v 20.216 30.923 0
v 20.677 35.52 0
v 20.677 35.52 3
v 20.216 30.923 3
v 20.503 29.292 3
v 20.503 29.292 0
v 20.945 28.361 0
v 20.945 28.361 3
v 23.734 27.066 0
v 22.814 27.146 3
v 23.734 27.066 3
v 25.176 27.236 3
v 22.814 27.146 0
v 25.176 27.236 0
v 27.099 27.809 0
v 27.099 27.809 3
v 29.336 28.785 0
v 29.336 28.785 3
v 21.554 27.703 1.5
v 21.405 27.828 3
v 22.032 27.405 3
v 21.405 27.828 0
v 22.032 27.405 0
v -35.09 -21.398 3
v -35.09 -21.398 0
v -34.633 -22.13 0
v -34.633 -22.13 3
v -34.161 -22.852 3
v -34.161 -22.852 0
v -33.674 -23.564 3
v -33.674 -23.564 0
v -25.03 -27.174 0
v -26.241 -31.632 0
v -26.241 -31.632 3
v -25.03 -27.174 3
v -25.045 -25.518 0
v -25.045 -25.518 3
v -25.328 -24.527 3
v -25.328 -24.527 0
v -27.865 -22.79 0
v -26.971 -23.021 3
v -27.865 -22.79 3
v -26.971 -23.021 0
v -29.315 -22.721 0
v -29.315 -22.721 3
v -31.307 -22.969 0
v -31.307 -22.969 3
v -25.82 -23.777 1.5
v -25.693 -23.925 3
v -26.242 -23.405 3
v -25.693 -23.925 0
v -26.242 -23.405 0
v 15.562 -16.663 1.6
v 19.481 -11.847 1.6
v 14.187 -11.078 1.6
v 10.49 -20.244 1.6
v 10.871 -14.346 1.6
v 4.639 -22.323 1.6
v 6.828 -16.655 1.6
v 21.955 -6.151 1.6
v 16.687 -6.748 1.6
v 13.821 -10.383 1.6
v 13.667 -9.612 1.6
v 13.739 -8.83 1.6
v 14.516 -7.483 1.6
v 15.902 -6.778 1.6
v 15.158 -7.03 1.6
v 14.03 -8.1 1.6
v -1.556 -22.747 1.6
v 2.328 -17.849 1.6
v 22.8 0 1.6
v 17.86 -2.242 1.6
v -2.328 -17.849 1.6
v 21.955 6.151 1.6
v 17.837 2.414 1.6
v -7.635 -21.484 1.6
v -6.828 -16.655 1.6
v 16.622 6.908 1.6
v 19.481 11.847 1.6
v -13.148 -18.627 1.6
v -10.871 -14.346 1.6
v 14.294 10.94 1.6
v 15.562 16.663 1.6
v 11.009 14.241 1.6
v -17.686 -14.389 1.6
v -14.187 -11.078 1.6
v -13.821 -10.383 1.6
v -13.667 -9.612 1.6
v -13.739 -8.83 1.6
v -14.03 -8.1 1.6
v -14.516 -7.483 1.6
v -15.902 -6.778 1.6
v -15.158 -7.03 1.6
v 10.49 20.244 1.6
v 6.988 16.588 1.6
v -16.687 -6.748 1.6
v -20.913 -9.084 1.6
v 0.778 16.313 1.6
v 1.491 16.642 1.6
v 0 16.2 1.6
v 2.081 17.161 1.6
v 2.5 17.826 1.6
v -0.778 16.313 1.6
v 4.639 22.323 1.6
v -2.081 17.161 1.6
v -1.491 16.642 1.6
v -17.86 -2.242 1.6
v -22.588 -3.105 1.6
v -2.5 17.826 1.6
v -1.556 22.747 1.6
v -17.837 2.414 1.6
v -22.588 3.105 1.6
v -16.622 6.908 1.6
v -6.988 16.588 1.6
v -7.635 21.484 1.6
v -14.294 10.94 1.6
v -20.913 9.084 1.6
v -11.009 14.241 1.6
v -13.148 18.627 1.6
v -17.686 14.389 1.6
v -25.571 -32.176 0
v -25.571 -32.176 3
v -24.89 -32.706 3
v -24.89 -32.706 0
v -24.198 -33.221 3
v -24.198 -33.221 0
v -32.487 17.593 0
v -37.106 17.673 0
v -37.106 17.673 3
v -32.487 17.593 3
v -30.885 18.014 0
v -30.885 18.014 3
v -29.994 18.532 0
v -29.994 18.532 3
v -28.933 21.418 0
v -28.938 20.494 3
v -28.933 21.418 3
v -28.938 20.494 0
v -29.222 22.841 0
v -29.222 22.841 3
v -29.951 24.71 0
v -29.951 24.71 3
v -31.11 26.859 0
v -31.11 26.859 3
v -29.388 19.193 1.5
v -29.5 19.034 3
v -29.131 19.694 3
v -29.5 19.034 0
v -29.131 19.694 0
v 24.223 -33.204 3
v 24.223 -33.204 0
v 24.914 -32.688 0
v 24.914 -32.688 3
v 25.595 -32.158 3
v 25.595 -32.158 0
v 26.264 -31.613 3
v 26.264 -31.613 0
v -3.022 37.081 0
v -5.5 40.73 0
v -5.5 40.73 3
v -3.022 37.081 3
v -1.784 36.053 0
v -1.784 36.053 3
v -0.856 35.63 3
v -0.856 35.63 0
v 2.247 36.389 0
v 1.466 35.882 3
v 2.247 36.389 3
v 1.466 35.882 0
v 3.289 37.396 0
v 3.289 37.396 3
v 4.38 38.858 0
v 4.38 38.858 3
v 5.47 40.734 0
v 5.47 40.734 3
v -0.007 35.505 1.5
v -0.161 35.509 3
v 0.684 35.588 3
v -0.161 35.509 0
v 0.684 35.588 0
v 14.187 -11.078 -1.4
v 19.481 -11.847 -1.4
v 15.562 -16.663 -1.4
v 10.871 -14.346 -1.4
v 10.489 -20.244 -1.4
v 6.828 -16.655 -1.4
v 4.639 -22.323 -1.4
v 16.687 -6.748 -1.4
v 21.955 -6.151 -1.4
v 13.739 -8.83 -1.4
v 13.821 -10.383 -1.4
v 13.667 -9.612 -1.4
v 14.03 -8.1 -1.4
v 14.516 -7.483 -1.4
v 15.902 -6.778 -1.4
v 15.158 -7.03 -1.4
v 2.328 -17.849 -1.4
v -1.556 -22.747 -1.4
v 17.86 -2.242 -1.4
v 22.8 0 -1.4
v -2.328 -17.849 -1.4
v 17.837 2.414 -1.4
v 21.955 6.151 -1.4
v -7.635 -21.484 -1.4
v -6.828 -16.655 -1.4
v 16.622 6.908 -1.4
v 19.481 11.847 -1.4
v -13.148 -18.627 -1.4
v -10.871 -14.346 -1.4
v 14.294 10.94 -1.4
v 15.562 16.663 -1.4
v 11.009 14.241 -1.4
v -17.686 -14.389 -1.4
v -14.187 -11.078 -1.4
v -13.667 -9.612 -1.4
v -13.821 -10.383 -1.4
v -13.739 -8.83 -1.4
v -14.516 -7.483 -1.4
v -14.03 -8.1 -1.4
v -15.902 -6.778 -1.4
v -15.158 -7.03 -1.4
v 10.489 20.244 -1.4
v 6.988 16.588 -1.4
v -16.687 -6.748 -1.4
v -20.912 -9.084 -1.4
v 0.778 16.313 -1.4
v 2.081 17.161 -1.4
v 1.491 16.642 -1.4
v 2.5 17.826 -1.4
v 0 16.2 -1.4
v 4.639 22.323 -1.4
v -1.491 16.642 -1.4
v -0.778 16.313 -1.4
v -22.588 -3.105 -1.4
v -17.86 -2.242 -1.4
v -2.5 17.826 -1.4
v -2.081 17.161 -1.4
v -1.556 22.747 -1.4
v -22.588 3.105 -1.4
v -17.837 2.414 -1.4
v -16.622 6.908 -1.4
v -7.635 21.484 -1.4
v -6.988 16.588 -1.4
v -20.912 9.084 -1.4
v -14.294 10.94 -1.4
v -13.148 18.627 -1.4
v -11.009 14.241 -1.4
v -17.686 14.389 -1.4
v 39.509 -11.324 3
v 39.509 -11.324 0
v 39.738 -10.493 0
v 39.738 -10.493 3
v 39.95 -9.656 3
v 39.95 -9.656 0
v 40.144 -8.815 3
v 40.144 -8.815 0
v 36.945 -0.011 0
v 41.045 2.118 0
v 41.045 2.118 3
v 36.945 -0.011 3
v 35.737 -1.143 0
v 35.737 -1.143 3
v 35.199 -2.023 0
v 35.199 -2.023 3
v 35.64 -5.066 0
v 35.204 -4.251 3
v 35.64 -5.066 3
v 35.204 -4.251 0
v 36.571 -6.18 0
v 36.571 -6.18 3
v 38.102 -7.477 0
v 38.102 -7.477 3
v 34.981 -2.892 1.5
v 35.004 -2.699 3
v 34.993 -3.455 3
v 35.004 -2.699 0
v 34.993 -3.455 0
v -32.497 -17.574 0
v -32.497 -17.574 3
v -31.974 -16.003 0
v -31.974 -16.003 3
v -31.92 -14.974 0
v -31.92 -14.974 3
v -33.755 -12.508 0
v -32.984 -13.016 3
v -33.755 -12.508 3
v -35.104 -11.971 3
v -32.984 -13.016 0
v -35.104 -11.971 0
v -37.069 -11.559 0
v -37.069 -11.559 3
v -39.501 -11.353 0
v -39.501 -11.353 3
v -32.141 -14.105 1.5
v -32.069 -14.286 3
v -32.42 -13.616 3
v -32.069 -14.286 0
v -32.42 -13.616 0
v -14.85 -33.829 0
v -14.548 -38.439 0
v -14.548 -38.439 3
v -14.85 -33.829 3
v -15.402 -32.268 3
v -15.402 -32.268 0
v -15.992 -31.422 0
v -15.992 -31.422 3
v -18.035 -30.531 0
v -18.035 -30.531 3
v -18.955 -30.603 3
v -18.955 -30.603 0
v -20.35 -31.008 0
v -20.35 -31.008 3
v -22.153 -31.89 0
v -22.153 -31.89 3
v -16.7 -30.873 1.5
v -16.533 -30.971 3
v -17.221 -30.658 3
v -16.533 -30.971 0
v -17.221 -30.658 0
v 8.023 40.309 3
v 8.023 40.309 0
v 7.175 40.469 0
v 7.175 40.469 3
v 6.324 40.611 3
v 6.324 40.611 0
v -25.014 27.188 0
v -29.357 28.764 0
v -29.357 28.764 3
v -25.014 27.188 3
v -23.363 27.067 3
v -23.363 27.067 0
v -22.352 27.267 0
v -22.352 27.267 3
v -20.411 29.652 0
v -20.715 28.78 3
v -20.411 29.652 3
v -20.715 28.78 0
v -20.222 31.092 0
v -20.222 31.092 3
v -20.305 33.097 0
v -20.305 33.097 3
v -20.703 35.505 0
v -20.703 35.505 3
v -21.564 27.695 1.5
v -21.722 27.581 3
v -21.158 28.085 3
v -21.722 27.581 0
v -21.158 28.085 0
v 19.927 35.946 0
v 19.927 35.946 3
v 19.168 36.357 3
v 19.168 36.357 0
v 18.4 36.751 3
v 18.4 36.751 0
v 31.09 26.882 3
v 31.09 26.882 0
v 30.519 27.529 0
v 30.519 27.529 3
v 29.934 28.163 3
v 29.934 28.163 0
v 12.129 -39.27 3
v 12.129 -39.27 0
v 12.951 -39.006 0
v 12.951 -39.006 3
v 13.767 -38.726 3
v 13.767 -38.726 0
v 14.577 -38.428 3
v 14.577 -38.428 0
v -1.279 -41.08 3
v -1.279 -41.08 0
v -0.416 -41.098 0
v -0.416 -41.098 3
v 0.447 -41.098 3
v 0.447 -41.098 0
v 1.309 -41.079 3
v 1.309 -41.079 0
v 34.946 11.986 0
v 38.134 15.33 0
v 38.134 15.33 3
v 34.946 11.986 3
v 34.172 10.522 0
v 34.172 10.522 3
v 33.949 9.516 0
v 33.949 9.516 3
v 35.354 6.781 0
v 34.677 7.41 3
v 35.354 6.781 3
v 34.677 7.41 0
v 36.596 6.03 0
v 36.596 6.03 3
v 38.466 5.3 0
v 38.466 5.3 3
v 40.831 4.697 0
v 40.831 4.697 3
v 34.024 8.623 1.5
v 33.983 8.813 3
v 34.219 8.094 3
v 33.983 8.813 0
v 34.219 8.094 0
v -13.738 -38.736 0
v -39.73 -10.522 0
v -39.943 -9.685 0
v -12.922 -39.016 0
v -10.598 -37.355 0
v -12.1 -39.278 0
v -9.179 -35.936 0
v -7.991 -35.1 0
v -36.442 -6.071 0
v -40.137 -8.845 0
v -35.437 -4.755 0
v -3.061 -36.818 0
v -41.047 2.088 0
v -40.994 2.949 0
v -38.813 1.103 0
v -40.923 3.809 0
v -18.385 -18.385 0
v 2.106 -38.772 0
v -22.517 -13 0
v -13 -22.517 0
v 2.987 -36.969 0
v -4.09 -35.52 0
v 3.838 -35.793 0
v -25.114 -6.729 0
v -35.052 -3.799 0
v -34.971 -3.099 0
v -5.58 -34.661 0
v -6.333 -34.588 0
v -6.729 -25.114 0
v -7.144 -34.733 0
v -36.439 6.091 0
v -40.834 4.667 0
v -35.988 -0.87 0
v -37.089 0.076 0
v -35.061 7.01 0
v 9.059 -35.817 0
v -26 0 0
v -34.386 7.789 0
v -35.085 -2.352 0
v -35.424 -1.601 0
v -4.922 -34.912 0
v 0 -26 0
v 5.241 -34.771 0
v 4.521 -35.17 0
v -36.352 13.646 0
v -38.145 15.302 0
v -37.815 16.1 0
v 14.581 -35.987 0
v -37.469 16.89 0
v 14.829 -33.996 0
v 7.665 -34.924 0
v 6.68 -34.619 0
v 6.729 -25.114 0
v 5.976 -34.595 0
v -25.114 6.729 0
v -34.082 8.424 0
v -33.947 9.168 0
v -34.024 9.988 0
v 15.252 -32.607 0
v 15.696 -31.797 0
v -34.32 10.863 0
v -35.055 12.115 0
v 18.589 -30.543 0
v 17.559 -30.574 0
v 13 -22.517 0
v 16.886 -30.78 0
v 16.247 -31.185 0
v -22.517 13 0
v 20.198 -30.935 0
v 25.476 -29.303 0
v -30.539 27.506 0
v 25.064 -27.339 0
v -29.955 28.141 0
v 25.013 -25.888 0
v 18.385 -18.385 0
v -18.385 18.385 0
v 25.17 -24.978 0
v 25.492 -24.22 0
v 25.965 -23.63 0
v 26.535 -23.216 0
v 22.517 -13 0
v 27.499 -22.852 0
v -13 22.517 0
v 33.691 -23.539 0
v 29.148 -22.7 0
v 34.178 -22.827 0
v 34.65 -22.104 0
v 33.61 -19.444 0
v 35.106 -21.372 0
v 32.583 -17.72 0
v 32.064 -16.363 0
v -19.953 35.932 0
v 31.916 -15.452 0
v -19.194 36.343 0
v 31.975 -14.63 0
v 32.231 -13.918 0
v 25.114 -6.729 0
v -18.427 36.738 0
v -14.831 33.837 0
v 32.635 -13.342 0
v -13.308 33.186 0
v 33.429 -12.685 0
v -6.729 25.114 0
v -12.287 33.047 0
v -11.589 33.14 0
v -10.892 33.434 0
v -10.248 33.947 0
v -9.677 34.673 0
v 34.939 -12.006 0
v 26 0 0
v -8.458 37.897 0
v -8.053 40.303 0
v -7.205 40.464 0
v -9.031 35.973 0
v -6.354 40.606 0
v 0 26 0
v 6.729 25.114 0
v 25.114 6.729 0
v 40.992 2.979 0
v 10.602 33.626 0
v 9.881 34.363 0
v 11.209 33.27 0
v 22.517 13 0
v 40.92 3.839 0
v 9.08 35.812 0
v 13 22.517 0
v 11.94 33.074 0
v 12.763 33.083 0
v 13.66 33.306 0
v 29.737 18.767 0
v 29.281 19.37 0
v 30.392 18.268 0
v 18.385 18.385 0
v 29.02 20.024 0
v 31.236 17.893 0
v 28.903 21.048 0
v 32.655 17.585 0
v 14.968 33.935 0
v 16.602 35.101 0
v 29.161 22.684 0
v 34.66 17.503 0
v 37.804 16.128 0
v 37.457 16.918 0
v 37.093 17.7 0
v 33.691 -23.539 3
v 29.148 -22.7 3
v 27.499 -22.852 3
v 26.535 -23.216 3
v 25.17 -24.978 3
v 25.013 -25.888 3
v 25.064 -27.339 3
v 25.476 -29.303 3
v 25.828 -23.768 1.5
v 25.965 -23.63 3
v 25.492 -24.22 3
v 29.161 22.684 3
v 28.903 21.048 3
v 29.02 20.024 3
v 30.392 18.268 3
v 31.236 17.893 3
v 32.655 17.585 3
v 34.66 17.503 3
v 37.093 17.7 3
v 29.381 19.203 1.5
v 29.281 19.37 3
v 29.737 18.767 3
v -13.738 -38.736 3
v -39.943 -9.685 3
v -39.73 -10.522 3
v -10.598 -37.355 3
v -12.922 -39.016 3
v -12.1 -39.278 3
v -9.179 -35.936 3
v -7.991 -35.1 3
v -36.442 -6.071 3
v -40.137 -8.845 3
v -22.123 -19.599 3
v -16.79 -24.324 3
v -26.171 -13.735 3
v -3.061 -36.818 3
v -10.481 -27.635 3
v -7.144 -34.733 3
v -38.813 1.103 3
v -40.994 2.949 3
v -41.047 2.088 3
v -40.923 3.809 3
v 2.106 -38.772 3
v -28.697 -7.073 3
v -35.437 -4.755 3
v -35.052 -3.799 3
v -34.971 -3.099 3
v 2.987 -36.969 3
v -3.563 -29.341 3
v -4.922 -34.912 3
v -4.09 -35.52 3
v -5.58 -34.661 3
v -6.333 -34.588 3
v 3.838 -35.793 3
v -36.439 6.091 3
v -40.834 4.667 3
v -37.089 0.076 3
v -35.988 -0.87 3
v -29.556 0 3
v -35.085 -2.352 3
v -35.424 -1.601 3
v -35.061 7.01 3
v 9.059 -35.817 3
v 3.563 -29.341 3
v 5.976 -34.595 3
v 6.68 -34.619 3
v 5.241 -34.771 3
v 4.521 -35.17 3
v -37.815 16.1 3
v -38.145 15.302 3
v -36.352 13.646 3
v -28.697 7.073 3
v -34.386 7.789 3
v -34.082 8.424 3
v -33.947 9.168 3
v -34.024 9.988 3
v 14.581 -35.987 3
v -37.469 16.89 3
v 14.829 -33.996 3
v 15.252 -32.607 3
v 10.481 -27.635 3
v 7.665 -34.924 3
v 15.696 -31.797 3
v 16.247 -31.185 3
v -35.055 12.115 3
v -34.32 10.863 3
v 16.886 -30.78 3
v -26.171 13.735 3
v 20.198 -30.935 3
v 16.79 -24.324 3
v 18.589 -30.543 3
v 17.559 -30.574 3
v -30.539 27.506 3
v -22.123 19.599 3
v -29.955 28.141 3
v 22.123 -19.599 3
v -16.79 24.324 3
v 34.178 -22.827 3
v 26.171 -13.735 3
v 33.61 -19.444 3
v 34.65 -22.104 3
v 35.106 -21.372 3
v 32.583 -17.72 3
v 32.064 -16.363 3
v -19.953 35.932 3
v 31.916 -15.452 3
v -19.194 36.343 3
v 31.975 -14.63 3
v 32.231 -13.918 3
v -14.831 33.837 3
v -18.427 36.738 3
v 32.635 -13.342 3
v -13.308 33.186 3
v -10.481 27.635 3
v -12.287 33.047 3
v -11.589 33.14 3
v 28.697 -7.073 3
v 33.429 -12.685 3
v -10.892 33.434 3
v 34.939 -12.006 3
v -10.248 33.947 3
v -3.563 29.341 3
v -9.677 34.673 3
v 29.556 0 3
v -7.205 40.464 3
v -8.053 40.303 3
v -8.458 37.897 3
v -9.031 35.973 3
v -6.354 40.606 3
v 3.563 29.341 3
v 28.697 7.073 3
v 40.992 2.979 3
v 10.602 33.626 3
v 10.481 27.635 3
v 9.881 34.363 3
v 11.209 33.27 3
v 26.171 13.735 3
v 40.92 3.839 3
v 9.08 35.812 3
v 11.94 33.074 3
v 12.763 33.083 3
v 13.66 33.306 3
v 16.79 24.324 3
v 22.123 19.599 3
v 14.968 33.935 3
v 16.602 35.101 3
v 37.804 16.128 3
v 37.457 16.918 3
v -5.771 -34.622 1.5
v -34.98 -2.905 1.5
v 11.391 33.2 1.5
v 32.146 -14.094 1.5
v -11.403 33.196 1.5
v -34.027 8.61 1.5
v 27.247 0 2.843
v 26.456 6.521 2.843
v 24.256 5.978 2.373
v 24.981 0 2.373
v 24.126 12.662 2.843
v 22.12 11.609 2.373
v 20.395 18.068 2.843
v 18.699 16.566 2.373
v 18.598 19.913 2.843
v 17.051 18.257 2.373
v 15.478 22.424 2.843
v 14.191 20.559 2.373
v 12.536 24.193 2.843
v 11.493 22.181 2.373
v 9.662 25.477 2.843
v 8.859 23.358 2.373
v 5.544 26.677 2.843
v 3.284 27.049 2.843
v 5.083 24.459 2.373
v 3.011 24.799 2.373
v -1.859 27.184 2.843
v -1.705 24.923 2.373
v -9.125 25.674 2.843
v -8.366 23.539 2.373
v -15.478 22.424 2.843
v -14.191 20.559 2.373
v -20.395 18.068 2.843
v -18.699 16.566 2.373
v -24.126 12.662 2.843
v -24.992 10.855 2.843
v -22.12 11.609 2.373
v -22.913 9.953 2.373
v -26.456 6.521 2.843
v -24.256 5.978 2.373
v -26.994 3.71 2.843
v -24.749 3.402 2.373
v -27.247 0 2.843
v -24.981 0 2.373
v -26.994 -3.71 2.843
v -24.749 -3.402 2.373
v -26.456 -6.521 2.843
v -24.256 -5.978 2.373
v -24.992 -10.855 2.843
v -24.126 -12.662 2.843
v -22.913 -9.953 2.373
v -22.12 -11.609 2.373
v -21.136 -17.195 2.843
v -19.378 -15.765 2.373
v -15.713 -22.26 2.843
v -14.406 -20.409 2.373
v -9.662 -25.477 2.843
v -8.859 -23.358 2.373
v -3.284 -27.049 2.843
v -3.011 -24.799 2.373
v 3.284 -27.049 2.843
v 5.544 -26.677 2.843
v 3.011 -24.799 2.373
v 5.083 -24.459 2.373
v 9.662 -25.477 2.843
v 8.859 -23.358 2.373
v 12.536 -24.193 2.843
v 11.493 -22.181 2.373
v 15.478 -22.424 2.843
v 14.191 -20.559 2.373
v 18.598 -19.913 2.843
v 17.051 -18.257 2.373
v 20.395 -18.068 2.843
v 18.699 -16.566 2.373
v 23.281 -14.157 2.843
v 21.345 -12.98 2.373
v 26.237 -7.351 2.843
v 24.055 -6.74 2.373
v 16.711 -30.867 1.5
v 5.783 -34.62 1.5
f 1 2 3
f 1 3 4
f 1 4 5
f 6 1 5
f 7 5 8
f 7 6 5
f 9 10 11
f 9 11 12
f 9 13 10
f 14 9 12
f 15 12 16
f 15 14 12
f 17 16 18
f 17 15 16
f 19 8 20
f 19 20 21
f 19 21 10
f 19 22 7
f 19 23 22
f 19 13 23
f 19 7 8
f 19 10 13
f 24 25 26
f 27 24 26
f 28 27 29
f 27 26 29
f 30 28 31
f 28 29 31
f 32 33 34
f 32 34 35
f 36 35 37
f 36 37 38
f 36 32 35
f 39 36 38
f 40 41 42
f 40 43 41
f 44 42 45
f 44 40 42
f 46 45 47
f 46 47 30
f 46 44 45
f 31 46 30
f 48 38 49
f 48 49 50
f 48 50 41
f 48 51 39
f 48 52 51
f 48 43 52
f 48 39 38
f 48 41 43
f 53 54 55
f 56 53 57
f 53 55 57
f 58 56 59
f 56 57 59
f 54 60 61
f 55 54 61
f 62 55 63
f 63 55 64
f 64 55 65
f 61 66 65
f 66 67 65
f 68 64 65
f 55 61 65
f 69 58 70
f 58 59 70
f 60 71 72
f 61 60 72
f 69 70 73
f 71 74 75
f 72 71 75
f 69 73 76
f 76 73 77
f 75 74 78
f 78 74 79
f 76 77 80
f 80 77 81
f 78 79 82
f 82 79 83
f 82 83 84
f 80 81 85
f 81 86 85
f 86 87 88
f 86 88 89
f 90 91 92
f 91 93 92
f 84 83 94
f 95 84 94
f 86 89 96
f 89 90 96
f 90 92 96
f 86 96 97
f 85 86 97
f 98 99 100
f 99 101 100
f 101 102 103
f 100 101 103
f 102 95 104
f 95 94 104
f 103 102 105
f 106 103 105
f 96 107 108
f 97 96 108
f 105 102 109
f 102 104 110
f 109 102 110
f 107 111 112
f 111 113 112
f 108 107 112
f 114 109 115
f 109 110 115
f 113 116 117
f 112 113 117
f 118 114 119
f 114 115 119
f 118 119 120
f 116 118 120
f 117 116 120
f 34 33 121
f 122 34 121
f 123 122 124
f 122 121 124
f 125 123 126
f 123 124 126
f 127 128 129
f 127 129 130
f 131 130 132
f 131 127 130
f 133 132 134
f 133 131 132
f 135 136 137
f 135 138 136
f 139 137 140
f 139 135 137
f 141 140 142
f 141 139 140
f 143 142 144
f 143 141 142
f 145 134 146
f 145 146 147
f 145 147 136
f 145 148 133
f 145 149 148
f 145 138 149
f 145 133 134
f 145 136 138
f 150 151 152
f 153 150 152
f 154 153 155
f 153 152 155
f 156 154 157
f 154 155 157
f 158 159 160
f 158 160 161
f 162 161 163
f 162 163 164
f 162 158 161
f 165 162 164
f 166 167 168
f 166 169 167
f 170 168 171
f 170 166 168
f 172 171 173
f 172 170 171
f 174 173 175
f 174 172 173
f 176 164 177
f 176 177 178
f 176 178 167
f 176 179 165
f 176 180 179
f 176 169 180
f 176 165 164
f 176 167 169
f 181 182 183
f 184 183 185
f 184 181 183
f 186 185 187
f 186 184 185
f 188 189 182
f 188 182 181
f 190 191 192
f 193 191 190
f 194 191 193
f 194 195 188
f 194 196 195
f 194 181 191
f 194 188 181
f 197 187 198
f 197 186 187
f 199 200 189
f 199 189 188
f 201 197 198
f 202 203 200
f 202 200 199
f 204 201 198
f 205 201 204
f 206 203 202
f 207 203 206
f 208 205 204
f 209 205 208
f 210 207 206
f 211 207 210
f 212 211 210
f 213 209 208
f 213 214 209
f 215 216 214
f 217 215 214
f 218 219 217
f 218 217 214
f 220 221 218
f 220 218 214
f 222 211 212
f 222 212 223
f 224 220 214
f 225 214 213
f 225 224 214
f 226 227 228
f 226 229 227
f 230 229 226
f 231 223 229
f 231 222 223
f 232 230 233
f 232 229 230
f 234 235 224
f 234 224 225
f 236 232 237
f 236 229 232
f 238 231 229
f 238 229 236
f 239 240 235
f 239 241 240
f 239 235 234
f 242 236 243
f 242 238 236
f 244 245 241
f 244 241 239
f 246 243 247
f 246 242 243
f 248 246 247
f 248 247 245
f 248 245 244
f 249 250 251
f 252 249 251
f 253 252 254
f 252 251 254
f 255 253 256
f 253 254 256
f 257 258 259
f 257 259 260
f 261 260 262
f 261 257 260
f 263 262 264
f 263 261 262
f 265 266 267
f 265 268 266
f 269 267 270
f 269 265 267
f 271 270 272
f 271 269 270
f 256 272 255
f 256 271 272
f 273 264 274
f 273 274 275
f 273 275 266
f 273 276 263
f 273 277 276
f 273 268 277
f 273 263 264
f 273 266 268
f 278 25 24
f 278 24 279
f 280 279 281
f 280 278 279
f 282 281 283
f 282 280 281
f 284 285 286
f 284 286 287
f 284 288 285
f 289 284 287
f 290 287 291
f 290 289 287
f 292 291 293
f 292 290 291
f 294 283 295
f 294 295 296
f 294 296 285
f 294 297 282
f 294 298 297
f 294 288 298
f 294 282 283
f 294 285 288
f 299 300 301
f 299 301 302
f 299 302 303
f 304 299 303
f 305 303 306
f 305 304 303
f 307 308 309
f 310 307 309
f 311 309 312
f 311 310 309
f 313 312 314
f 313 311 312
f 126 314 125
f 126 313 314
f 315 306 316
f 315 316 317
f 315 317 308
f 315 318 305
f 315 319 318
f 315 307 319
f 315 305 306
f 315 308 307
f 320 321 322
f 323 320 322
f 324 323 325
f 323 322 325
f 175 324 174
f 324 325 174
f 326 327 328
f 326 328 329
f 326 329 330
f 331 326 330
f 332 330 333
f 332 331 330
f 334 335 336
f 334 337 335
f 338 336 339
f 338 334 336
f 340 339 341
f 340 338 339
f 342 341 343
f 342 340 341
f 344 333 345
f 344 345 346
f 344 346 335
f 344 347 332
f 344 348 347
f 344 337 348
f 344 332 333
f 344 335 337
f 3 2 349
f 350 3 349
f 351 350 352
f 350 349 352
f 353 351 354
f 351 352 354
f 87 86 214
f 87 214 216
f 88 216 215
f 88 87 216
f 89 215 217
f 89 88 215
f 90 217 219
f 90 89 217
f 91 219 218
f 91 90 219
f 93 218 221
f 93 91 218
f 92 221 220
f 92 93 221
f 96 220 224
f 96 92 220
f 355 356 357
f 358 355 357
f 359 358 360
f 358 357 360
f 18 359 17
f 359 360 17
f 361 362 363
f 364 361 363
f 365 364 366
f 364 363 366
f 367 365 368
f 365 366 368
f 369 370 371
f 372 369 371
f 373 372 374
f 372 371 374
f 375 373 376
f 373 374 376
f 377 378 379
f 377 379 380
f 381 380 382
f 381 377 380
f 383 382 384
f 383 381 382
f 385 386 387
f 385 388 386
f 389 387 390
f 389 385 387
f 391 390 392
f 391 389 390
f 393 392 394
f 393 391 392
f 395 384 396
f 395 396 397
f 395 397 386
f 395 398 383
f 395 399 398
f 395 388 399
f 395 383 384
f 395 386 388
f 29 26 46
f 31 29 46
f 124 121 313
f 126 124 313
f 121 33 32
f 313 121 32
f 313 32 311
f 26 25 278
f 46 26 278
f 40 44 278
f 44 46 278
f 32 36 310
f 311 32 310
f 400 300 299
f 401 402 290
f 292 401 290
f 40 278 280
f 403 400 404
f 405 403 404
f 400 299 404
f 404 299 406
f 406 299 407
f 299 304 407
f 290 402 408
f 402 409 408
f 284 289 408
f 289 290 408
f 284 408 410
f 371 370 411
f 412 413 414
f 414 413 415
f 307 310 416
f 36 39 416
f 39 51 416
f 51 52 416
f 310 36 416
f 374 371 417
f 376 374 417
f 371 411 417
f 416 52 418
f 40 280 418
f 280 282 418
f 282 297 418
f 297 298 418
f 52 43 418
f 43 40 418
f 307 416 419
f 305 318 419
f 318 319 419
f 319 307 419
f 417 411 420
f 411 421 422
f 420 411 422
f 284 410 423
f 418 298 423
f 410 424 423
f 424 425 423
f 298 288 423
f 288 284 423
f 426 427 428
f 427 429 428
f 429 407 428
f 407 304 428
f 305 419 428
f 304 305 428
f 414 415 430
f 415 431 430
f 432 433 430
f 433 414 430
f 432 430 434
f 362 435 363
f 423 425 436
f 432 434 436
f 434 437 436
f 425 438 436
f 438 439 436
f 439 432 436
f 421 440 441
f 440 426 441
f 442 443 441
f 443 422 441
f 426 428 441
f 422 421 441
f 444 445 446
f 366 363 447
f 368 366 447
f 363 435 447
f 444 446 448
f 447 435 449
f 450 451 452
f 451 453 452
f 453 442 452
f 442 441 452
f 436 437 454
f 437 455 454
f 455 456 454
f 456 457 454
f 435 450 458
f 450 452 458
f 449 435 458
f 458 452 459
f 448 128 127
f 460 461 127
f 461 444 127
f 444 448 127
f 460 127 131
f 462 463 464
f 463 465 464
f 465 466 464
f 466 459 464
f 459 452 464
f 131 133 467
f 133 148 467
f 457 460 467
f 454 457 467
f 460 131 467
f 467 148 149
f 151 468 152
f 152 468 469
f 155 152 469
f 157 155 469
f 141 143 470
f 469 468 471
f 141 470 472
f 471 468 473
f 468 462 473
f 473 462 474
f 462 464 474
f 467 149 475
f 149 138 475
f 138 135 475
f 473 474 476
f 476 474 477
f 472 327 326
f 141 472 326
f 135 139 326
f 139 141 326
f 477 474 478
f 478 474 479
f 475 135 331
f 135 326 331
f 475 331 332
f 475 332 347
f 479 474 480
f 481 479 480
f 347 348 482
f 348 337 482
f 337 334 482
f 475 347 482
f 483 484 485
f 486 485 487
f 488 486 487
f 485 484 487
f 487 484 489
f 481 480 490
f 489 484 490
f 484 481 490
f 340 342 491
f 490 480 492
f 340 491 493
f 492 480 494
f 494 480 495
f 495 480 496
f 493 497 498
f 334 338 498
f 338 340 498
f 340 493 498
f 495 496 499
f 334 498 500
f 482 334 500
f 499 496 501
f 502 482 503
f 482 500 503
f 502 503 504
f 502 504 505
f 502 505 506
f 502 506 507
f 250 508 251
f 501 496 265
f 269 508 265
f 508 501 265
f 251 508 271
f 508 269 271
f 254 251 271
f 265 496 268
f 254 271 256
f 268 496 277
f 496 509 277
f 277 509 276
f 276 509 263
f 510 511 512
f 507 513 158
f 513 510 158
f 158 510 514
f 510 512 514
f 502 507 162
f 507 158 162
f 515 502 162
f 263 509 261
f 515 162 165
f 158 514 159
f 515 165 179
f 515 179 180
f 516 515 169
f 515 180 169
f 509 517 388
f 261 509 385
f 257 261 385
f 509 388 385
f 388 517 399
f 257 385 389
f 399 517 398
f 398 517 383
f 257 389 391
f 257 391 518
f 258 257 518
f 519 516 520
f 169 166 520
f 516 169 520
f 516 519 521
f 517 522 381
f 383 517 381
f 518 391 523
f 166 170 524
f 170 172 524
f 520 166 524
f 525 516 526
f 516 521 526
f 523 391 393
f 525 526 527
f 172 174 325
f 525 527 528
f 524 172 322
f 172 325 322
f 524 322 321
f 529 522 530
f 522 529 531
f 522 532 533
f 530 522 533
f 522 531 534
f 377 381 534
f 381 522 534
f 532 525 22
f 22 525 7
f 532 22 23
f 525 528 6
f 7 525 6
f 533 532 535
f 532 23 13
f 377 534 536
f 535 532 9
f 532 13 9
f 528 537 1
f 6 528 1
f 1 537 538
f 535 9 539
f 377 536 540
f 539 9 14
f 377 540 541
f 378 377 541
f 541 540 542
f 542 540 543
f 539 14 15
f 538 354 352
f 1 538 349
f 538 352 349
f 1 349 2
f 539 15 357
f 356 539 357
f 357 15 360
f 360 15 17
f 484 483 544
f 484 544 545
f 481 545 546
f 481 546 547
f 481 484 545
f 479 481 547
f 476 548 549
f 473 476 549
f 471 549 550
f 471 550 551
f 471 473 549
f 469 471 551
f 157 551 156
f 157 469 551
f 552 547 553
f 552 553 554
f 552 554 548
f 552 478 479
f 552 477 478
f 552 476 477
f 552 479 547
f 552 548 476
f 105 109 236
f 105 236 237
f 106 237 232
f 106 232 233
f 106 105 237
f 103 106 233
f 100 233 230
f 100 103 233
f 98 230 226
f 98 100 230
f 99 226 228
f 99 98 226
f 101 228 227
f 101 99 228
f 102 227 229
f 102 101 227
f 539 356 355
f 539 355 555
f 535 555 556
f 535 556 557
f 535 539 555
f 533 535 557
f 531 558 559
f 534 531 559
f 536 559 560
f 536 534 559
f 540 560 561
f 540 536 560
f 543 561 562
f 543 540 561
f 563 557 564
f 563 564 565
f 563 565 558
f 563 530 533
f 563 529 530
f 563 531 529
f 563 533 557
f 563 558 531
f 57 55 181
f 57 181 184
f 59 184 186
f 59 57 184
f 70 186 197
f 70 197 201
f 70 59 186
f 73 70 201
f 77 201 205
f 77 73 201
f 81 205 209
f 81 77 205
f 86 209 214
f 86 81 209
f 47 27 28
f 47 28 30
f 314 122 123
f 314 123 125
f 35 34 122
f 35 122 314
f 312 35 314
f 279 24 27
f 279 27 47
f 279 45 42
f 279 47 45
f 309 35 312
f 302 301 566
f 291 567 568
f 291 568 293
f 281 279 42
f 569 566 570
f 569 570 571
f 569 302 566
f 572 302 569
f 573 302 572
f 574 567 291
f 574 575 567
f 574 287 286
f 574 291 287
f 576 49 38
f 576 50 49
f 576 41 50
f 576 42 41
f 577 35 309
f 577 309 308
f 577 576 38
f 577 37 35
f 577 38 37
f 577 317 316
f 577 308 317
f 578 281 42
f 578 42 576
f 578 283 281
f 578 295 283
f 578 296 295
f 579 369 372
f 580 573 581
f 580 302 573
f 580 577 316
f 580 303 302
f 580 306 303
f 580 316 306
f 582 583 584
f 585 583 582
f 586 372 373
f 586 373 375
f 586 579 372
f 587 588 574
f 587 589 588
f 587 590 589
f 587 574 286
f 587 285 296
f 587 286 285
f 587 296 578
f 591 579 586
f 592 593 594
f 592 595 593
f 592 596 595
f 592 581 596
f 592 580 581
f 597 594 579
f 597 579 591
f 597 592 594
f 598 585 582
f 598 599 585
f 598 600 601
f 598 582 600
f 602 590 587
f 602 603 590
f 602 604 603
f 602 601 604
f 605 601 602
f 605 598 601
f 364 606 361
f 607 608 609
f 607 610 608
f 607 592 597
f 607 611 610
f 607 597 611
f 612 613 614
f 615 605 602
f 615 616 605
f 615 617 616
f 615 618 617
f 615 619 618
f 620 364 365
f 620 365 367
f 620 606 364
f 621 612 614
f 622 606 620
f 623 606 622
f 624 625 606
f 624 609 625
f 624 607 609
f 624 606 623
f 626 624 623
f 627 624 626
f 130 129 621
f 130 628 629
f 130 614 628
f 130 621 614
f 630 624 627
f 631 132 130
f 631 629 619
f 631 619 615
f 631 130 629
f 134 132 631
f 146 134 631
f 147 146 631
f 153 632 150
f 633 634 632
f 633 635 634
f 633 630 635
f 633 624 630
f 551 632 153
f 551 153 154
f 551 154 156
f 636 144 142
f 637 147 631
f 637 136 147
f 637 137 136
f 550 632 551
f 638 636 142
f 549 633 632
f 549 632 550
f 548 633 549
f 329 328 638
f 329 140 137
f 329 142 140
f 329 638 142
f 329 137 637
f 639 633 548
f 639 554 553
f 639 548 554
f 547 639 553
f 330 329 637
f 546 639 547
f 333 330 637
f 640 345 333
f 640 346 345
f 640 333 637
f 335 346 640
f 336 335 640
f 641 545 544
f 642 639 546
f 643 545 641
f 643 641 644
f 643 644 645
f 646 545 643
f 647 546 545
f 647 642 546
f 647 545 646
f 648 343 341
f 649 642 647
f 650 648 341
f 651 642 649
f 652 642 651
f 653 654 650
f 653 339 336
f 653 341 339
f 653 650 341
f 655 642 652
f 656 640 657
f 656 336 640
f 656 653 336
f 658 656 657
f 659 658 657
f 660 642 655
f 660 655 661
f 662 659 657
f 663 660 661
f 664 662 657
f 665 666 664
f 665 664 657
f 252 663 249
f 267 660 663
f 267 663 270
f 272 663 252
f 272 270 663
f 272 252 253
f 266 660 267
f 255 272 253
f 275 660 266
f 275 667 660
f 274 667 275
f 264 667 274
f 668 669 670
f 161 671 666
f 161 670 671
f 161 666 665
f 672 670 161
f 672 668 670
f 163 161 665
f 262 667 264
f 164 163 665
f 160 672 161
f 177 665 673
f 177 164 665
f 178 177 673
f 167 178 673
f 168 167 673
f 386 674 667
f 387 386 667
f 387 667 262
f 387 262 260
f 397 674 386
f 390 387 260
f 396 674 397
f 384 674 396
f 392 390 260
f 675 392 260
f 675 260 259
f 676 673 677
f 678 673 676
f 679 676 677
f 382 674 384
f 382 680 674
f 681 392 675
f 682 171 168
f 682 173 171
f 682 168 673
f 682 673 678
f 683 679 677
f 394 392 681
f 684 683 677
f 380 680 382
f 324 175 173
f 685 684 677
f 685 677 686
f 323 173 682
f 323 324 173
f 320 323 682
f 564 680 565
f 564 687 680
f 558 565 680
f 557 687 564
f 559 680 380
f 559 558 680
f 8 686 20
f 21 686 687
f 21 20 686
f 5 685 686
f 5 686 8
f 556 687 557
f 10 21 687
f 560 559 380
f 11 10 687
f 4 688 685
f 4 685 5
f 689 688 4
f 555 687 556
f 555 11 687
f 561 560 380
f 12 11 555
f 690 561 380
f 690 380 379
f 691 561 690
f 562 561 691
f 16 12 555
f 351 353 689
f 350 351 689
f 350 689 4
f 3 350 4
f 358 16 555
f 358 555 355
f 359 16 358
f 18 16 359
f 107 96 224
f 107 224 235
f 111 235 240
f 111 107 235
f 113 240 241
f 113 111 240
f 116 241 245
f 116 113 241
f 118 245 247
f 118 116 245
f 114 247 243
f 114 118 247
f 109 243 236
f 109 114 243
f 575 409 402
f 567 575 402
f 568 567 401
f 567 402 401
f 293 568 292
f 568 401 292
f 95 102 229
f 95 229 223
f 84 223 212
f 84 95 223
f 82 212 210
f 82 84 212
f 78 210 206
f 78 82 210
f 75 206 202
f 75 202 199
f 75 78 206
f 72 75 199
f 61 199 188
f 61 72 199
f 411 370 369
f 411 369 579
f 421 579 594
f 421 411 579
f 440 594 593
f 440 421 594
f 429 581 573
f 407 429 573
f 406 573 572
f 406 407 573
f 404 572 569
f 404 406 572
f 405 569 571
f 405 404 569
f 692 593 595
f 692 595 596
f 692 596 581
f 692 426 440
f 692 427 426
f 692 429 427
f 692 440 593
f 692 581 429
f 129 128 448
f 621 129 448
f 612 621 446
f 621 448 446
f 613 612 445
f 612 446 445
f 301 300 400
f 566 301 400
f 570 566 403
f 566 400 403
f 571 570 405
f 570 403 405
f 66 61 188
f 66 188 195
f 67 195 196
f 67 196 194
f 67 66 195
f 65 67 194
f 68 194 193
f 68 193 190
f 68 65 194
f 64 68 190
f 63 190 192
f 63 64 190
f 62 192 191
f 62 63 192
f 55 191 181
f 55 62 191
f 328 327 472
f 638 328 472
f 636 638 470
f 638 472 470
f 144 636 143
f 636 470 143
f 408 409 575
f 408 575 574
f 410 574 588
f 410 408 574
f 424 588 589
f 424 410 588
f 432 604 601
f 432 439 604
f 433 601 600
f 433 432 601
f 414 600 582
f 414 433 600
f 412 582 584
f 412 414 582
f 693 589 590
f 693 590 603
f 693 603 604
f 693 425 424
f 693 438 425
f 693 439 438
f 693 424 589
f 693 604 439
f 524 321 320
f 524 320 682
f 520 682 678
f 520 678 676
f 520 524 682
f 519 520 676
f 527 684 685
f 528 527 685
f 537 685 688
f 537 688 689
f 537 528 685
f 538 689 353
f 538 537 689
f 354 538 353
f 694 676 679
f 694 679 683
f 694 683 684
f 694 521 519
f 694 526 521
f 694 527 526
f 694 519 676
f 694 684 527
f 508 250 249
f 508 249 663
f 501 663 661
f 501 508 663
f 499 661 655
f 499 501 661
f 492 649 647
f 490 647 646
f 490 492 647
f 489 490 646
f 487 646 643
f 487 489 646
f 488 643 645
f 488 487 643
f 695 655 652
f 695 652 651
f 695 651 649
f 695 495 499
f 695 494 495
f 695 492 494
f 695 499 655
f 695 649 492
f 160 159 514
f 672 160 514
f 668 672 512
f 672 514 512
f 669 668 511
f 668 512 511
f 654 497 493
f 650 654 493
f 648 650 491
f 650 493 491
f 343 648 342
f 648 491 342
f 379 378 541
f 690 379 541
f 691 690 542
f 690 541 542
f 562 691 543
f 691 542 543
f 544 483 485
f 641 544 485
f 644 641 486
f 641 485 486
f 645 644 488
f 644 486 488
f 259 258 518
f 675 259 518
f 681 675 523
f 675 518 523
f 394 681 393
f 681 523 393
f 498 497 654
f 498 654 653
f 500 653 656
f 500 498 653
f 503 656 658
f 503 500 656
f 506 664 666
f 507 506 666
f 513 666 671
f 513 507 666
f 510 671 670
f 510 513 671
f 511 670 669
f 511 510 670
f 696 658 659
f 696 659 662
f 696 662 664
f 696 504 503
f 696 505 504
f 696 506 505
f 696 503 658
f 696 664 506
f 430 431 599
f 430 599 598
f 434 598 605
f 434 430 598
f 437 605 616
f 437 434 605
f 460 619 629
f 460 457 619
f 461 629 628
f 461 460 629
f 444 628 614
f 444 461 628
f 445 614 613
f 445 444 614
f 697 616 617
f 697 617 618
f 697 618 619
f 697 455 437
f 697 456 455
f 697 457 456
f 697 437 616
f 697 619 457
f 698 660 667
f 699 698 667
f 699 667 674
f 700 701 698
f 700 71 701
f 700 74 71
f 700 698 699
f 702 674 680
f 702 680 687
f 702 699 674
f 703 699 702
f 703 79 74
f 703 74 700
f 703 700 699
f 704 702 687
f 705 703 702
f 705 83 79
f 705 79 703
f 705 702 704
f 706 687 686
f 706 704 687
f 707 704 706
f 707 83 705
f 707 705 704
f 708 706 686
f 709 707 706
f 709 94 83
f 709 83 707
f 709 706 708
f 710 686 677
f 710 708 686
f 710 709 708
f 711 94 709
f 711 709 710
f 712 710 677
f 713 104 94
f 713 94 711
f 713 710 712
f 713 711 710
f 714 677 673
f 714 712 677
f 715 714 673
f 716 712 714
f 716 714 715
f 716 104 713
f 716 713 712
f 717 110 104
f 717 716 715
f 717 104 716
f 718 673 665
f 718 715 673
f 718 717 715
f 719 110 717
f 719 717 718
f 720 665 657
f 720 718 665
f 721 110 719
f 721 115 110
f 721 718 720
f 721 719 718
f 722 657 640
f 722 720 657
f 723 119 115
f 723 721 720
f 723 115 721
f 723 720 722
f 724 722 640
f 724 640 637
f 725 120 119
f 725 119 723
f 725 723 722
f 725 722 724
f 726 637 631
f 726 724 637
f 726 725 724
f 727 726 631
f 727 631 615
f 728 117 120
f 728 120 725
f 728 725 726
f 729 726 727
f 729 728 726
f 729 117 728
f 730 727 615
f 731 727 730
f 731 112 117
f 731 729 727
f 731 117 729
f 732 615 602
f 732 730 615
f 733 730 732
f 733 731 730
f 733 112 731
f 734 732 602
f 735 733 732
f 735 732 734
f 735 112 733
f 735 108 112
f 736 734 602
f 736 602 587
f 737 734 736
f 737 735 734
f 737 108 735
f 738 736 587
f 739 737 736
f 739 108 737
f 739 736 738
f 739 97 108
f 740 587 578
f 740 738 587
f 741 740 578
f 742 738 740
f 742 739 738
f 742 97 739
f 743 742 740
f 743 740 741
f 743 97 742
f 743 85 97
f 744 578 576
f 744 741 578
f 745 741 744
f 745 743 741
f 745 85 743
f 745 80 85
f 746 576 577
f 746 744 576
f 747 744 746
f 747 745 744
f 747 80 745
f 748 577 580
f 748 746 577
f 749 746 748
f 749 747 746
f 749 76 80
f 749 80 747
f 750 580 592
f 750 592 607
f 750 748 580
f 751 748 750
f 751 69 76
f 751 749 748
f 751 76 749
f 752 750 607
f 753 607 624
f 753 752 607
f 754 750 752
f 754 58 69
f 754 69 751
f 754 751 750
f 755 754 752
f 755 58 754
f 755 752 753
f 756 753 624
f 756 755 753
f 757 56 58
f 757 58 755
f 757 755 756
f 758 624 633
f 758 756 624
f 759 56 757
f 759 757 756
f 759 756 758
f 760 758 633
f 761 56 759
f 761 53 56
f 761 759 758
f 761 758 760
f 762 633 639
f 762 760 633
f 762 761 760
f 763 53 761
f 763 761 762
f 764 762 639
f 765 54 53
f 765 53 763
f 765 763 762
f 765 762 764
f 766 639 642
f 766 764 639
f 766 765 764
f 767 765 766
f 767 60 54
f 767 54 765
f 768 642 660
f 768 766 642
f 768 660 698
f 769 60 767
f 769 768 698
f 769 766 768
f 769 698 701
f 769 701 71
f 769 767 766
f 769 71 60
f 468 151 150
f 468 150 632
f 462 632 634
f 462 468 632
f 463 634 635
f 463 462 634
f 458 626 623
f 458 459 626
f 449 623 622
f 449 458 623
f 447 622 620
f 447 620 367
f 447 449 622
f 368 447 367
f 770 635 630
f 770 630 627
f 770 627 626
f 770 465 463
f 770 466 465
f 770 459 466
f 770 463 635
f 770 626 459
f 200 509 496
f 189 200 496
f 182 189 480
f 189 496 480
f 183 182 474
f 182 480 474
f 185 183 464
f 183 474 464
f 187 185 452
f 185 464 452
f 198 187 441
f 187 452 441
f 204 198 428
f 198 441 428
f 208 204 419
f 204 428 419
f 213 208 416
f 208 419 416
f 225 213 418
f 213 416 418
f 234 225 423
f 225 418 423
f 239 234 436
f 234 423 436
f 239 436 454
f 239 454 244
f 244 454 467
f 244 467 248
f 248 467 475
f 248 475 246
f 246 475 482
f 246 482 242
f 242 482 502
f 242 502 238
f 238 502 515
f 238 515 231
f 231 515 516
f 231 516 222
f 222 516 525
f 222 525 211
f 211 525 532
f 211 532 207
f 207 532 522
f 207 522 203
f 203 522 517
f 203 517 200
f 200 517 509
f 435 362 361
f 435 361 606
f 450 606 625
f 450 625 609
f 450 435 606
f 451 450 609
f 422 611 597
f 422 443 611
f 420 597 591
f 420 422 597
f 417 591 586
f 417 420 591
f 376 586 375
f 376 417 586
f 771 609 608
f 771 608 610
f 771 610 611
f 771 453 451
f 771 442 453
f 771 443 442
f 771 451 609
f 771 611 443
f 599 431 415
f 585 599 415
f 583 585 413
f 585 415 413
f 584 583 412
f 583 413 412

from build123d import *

# Parameters (mm, degrees)
SKETCH_1_R      = 26
EXTRUDE_1_DEPTH = 3
SKETCH_2_R      = 22.8
EXTRUDE_2_DEPTH = 3
FILLET_8_R      = 17


with BuildPart() as part:
    # Эскиз1 → Вытянуть1 (new body)
    with BuildSketch(Plane.XY):
        with BuildLine():
            ThreePointArc((-5.5, 40.730332677), (-6.779718382, 40.536963609), (-8.052713795, 40.303396886))
            add(Edge.make_bspline(
                [(-18.42711223, 36.737603826), (-9.565846889, 27.871779004), (-8.052713795, 40.303396886)],
                knots=[0, 0, 0, 1, 1, 1], degree=2))
            ThreePointArc((-18.42711223, 36.737603826), (-19.574705107, 36.139188148), (-20.702887125, 35.504935779))
            add(Edge.make_bspline(
                [(-29.357360924, 28.763785557), (-18.097494767, 23.255583732), (-20.702887125, 35.504935779)],
                knots=[0, 0, 0, 1, 1, 1], degree=2))
            ThreePointArc((-29.357360924, 28.763785557), (-30.2484688, 27.825170893), (-31.109581398, 26.858963965))
            add(Edge.make_bspline(
                [(-37.106284036, 17.672964807), (-24.667998276, 16.119285114), (-31.109581398, 26.858963965)],
                knots=[0, 0, 0, 1, 1, 1], degree=2))
            ThreePointArc((-37.106284036, 17.672964807), (-37.644341546, 16.49586462), (-38.145069811, 15.302406645))
            add(Edge.make_bspline(
                [(-40.834165508, 4.667004096), (-28.565341408, 7.236211838), (-38.145069811, 15.302406645)],
                knots=[0, 0, 0, 1, 1, 1], degree=2))
            ThreePointArc((-40.834165508, 4.667004096), (-40.960865773, 3.378975456), (-41.046948028, 2.087596124))
            add(Edge.make_bspline(
                [(-40.137031541, -8.844698925), (-29.367186562, -2.431017271), (-41.046948028, 2.087596124)],
                knots=[0, 0, 0, 1, 1, 1], degree=2))
            ThreePointArc((-40.137031541, -8.844698925), (-39.83864462, -10.104078129), (-39.500752518, -11.353437829))
            add(Edge.make_bspline(
                [(-35.090427416, -21.397941578), (-26.986641373, -11.834807939), (-39.500752518, -11.353437829)],
                knots=[0, 0, 0, 1, 1, 1], degree=2))
            ThreePointArc((-35.090427416, -21.397941578), (-34.399288162, -22.492198068), (-33.674037554, -23.564150627))
            add(Edge.make_bspline(
                [(-26.241230996, -31.632385237), (-21.68167485, -19.95611353), (-33.674037554, -23.564150627)],
                knots=[0, 0, 0, 1, 1, 1], degree=2))
            ThreePointArc((-26.241230996, -31.632385237), (-25.232235072, -32.442939344), (-24.198218116, -33.221322069))
            add(Edge.make_bspline(
                [(-14.548390024, -38.438969129), (-14.027162432, -25.91486457), (-24.198218116, -33.221322069)],
                knots=[0, 0, 0, 1, 1, 1], degree=2))
            ThreePointArc((-14.548390024, -38.438969129), (-13.330877794, -38.877984737), (-12.10014627, -39.278447783))
            add(Edge.make_bspline(
                [(-1.27900525, -41.080094274), (-4.85258931, -29.065337922), (-12.10014627, -39.278447783)],
                knots=[0, 0, 0, 1, 1, 1], degree=2))
            ThreePointArc((-1.27900525, -41.080094274), (0.015086944, -41.099997231), (1.309164177, -41.079144212))
            add(Edge.make_bspline(
                [(12.128979588, -39.269553781), (4.84783716, -29.066130916), (1.309164177, -41.079144212)],
                knots=[0, 0, 0, 1, 1, 1], degree=2))
            ThreePointArc((12.128979588, -39.269553781), (13.359416777, -38.868187292), (14.576606372, -38.428277956))
            add(Edge.make_bspline(
                [(24.222601287, -33.203547806), (14.022925251, -25.917157617), (14.576606372, -38.428277956)],
                knots=[0, 0, 0, 1, 1, 1], degree=2))
            ThreePointArc((24.222601287, -33.203547806), (25.256046509, -32.424406158), (26.264447087, -31.613111508))
            add(Edge.make_bspline(
                [(33.691328284, -23.53942222), (21.678411803, -19.959658145), (26.264447087, -31.613111508)],
                knots=[0, 0, 0, 1, 1, 1], degree=2))
            ThreePointArc((33.691328284, -23.53942222), (34.415791714, -22.466937501), (35.106127425, -21.3721739))
            add(Edge.make_bspline(
                [(39.509077087, -11.324434984), (26.984706061, -11.839220006), (35.106127425, -21.3721739)],
                knots=[0, 0, 0, 1, 1, 1], degree=2))
            ThreePointArc((39.509077087, -11.324434984), (39.846051872, -10.074827555), (40.143514129, -8.815229627))
            add(Edge.make_bspline(
                [(41.045404341, 2.117730498), (29.366788706, -2.435818675), (40.143514129, -8.815229627)],
                knots=[0, 0, 0, 1, 1, 1], degree=2))
            ThreePointArc((41.045404341, 2.117730498), (40.958374033, 3.409046284), (40.830728186, 4.696981559))
            add(Edge.make_bspline(
                [(38.13382515, 15.330407021), (28.566524123, 7.231541404), (40.830728186, 4.696981559)],
                knots=[0, 0, 0, 1, 1, 1], degree=2))
            ThreePointArc((38.13382515, 15.330407021), (37.632220833, 16.523497062), (37.093299291, 17.700201912))
            add(Edge.make_bspline(
                [(31.089854296, 26.881796068), (24.670633395, 16.115251764), (37.093299291, 17.700201912)],
                knots=[0, 0, 0, 1, 1, 1], degree=2))
            ThreePointArc((31.089854296, 26.881796068), (30.228032583, 27.847370544), (29.336235855, 28.785330741))
            add(Edge.make_bspline(
                [(20.676815321, 35.520125397), (18.101296735, 23.252624541), (29.336235855, 28.785330741)],
                knots=[0, 0, 0, 1, 1, 1], degree=2))
            ThreePointArc((20.676815321, 35.520125397), (19.548167965, 36.153549331), (18.400136066, 36.751122333))
            add(Edge.make_bspline(
                [(8.023122571, 40.309297987), (9.570403703, 27.870214648), (18.400136066, 36.751122333)],
                knots=[0, 0, 0, 1, 1, 1], degree=2))
            ThreePointArc((8.023122571, 40.309297987), (6.749956027, 40.541930068), (5.470096027, 40.734359569))
            add(Edge.make_bspline(
                [(-5.5, 40.730332677), (0.001292393, 30.277504211), (5.470096027, 40.734359569)],
                knots=[0, 0, 0, 1, 1, 1], degree=2))
        make_face()
        Circle(SKETCH_1_R, mode=Mode.SUBTRACT)
    extrude(amount=EXTRUDE_1_DEPTH)



with BuildPart() as body_2:
    # Эскиз2 → Вытянуть2 (new body)
    with BuildSketch(Plane(origin=(0, 0, 1.6), x_dir=(-1, 0, 0), z_dir=(0, 0, -1))):
        Circle(SKETCH_2_R)
        with BuildLine():
            ThreePointArc((16.687373481, -6.747708226), (15.588457268, 9), (2.5, 17.82554347))
            ThreePointArc((2.5, 17.82554347), (0, 16.199996074), (-2.5, 17.82554347))
            ThreePointArc((-2.5, 17.82554347), (-15.588457268, 9), (-16.687373481, -6.747708226))
            ThreePointArc((-16.687373481, -6.747708226), (-14.029608141, -8.099998037), (-14.187373481, -11.077835244))
            ThreePointArc((-14.187373481, -11.077835244), (0, -18), (14.187373481, -11.077835244))
            ThreePointArc((14.187373481, -11.077835244), (14.029608141, -8.099998037), (16.687373481, -6.747708226))
        make_face(mode=Mode.SUBTRACT)
    extrude(amount=EXTRUDE_2_DEPTH)


with BuildPart() as part_1:
    add(part.part)

    add(body_2.part)  # Повернуть1 merges body 2
    # Эскиз18 → Повернуть1 (revolve)
    with BuildSketch(Plane(origin=(0, 0, 0), x_dir=(1, 0, 0), z_dir=(0, 1, 0))):
        Polygon((26, -3), (22.8, -1.6), (22.8, 1.4), (26, 0), align=None)
    revolve(axis=Axis((0, 0, 0), (0, 0, -1)))

    # Скругление8
    # the kernel refuses this fillet: 17 mm, written as the material it takes off along each edge
    with BuildSketch(Plane(origin=(0, 0, 3), x_dir=(1, 0, 0), z_dir=(0, -1, 0))) as fillet_8_piece_1_section:
        with BuildLine():
            CenterArc((26 + FILLET_8_R * 0.209178456653, -FILLET_8_R), FILLET_8_R, 90, 23.629377731)
            Line((26 - FILLET_8_R * 0.191640377366, -FILLET_8_R * 0.0838426650978), (26, 0))
            Line((26, 0), (26 + FILLET_8_R * 0.209178456653, 0))
        make_face()
    fillet_8_piece_1 = revolve(axis=Axis((0, 0, 3), (0, 0, 1)), mode=Mode.PRIVATE)
    fillet_8_piece_1 = split(fillet_8_piece_1, bisect_by=Plane(origin=(-26.08987022, 0, 1.6), z_dir=(0, 0, 1)), keep=Keep.TOP, mode=Mode.PRIVATE)
    add(fillet_8_piece_1, mode=Mode.SUBTRACT)


solid = part_1.part
